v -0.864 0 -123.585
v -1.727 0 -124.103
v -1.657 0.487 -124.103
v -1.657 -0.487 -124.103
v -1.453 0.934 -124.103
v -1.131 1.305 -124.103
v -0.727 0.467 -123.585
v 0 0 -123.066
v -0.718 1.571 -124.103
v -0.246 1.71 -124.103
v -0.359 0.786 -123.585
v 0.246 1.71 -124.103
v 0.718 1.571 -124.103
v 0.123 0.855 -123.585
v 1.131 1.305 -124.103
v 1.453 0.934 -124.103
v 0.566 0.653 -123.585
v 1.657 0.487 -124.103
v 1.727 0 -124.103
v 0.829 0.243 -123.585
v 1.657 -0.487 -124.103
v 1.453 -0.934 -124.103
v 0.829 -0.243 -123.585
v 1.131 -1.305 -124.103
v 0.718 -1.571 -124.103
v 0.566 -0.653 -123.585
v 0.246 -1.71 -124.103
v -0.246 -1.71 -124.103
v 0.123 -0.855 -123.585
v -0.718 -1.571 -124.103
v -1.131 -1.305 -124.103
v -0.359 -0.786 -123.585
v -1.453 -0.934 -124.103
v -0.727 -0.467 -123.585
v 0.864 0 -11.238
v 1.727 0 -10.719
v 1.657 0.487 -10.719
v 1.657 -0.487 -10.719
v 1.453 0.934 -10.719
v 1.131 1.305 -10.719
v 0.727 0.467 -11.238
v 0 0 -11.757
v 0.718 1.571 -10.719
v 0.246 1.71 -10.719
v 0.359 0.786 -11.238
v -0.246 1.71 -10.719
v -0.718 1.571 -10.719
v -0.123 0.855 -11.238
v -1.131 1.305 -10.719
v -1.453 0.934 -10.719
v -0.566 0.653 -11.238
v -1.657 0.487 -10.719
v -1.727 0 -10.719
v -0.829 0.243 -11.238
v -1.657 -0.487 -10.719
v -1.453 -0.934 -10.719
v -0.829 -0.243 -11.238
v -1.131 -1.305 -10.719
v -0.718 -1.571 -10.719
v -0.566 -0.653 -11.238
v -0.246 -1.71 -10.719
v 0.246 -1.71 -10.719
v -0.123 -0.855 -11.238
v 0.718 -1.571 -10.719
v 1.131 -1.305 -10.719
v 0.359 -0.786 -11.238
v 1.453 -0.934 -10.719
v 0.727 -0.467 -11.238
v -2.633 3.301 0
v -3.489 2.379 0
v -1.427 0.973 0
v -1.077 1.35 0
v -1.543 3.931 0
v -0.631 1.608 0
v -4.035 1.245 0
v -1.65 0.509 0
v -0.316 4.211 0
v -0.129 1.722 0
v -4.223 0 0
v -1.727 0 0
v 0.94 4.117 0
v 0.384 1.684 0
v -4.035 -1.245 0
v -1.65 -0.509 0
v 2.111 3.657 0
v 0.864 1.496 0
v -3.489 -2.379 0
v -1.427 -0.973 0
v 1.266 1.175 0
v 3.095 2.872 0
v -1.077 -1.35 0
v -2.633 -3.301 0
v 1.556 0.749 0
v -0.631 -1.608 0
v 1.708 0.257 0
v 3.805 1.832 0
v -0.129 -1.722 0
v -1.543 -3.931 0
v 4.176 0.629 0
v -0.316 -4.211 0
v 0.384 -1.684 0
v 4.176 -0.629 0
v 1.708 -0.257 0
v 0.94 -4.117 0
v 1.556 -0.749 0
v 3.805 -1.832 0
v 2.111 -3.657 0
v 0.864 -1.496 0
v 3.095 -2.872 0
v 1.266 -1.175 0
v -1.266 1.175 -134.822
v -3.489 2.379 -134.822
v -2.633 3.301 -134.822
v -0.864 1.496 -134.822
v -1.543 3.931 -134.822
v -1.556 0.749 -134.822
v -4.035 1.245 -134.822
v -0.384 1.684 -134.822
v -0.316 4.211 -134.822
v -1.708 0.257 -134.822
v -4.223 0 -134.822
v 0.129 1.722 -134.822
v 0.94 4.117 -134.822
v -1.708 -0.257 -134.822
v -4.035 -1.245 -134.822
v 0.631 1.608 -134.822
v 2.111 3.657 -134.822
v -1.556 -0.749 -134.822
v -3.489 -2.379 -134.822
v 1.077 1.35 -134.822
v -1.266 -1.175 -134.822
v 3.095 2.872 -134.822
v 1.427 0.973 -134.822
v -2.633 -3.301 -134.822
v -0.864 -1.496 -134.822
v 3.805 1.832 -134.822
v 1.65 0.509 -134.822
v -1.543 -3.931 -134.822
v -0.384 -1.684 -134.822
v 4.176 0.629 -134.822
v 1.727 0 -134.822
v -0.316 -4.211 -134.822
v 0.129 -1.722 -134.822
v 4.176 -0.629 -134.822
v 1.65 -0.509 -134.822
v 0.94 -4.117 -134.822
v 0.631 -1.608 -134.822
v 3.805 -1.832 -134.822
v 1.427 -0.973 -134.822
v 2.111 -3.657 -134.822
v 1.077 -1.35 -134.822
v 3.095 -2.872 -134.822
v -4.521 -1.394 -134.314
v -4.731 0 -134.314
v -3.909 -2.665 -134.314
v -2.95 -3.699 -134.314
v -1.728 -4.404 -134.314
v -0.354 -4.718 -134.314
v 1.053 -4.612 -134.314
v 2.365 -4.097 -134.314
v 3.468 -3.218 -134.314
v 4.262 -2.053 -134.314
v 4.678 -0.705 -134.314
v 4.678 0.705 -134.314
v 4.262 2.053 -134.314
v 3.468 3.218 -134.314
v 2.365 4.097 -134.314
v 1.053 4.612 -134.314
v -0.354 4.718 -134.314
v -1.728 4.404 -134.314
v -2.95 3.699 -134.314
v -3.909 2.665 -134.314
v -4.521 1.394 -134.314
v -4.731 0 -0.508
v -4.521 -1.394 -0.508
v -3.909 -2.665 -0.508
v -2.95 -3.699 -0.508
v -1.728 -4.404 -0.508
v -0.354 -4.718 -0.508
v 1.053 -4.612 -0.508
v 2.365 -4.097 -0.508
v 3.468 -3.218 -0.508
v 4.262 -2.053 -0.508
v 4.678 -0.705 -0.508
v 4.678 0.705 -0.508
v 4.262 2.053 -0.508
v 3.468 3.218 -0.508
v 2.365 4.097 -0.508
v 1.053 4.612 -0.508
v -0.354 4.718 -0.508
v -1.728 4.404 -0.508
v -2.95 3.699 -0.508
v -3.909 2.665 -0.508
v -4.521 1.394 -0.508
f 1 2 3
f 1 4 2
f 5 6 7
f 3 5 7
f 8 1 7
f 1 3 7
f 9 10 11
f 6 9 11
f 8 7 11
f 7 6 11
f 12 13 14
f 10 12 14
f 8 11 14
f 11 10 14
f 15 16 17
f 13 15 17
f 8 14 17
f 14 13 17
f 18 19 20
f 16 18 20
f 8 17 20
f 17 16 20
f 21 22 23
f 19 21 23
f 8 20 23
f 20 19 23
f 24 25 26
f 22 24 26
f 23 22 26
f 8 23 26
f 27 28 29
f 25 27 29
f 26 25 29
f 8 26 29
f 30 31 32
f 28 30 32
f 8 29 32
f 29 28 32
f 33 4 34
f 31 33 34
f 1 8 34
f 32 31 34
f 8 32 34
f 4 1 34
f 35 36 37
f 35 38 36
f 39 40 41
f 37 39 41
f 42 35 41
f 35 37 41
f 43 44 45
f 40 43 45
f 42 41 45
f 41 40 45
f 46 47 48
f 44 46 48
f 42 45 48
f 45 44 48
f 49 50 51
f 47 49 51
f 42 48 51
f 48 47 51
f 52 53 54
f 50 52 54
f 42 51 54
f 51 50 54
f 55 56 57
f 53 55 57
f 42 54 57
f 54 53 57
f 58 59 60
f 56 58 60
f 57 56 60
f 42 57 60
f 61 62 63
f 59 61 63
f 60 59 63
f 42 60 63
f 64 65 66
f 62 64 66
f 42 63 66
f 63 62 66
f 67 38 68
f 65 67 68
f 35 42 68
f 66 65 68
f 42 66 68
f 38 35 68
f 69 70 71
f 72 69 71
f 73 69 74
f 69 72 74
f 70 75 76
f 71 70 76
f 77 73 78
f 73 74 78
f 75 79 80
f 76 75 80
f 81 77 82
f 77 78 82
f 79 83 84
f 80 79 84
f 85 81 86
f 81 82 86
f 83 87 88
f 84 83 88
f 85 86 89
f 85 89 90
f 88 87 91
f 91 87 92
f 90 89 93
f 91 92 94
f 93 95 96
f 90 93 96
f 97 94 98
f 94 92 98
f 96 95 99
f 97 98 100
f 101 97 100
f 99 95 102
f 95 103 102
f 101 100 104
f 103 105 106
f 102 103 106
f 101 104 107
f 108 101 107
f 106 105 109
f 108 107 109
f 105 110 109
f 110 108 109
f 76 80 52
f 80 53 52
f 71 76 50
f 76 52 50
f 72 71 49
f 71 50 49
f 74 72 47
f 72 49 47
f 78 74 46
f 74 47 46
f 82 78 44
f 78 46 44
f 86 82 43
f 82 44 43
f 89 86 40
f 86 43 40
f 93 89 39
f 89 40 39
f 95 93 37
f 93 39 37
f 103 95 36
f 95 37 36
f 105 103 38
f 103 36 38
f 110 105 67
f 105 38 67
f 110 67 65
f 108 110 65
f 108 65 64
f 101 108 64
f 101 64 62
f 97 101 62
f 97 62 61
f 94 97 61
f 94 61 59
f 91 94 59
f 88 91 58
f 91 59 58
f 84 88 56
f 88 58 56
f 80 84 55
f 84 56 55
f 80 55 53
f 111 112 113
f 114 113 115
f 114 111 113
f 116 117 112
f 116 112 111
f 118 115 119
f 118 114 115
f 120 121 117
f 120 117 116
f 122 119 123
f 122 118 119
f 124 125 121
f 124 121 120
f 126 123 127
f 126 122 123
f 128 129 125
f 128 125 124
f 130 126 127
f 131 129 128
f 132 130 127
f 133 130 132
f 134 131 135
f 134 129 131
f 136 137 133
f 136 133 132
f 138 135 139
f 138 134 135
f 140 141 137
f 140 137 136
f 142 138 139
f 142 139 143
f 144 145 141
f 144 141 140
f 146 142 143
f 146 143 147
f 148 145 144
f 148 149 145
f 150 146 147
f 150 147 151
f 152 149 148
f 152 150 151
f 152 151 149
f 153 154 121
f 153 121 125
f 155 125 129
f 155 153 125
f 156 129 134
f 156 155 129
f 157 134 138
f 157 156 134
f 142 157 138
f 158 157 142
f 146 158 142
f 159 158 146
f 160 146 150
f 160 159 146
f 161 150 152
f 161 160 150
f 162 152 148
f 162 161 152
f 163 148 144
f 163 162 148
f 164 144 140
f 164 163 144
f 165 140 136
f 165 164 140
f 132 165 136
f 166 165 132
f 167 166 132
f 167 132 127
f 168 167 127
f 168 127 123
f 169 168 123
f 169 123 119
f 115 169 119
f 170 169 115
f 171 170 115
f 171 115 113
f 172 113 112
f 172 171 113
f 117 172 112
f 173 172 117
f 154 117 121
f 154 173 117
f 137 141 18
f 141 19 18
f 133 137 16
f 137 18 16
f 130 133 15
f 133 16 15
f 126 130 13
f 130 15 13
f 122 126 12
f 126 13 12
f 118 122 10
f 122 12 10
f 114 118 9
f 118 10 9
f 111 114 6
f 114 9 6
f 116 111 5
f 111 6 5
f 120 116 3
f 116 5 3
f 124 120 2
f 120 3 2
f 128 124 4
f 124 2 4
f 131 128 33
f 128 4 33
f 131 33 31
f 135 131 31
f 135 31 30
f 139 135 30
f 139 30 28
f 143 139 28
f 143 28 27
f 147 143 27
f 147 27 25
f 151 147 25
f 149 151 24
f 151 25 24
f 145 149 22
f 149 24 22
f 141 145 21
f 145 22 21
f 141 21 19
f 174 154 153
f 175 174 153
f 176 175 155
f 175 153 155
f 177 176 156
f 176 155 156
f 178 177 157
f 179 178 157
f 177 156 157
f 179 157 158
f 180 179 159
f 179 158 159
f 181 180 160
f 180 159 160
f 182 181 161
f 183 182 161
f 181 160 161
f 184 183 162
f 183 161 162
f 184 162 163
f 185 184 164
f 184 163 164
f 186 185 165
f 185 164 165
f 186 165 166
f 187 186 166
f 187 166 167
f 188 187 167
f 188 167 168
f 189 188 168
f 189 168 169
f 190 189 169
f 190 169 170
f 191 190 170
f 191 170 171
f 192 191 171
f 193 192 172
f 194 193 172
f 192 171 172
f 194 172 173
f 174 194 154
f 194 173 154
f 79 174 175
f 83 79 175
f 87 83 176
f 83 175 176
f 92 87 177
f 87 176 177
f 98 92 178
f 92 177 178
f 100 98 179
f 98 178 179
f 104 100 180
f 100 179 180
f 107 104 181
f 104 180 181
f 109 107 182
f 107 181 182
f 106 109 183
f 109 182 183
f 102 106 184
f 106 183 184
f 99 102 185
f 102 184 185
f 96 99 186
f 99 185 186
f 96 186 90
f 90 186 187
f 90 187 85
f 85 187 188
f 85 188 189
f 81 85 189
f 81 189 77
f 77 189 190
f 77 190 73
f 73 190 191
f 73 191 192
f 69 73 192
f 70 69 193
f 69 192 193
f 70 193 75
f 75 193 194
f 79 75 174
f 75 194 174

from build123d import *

# Parameters (mm, degrees)
SKETCH1_W                 = 134.82228219
SKETCH1_H                 = 4.73075
CHAMFER1_SIZE             = 0.508
F_8_32_TAPPED_HOLE1_D     = 3.4544
F_8_32_TAPPED_HOLE1_DEPTH = 10.7188
F_8_32_TAPPED_HOLE1_TIP   = 1.037806461
F_8_32_TAPPED_HOLE3_D     = 3.4544
F_8_32_TAPPED_HOLE3_DEPTH = 10.7188
F_8_32_TAPPED_HOLE3_TIP   = 1.037806461


with BuildPart() as part:
    # Sketch1 → Revolve1 (revolve)
    with BuildSketch(Plane(origin=(0, 0, 0), x_dir=(0, 0, -1), z_dir=(1, 0, 0)), mode=Mode.PRIVATE) as revolve1_sk:
        with Locations((67.411141095, 2.365375)):
            Rectangle(SKETCH1_W, SKETCH1_H)
    revolve(revolve1_sk.sketch.rotate(Axis((0, 0, 0), (0, 0, 1)), 90), axis=Axis((0, 0, 0), (0, 0, 1)))

    # Chamfer1
    chamfer1_edges = [part.edges().sort_by_distance(p)[0] for p in [
        (4.73075, 0, -134.82228219),
        (4.73075, 0, 0),
    ]]
    chamfer(chamfer1_edges, length=CHAMFER1_SIZE)

    # #8-32 Tapped Hole1
    with Locations(Plane.XY):
        with Locations((0, 0)):
            Hole(F_8_32_TAPPED_HOLE1_D / 2, depth=F_8_32_TAPPED_HOLE1_DEPTH)
            with Locations((0, 0, -(F_8_32_TAPPED_HOLE1_DEPTH + F_8_32_TAPPED_HOLE1_TIP / 2))):  # 118° drill point
                Cone(0, F_8_32_TAPPED_HOLE1_D / 2, F_8_32_TAPPED_HOLE1_TIP, mode=Mode.SUBTRACT)

    # #8-32 Tapped Hole3
    with Locations(Plane(origin=(0, 0, -134.82228219), x_dir=(-1, 0, 0), z_dir=(0, 0, -1))):
        with Locations((0, 0)):
            Hole(F_8_32_TAPPED_HOLE3_D / 2, depth=F_8_32_TAPPED_HOLE3_DEPTH)
            with Locations((0, 0, -(F_8_32_TAPPED_HOLE3_DEPTH + F_8_32_TAPPED_HOLE3_TIP / 2))):  # 118° drill point
                Cone(0, F_8_32_TAPPED_HOLE3_D / 2, F_8_32_TAPPED_HOLE3_TIP, mode=Mode.SUBTRACT)


solid = part.part
